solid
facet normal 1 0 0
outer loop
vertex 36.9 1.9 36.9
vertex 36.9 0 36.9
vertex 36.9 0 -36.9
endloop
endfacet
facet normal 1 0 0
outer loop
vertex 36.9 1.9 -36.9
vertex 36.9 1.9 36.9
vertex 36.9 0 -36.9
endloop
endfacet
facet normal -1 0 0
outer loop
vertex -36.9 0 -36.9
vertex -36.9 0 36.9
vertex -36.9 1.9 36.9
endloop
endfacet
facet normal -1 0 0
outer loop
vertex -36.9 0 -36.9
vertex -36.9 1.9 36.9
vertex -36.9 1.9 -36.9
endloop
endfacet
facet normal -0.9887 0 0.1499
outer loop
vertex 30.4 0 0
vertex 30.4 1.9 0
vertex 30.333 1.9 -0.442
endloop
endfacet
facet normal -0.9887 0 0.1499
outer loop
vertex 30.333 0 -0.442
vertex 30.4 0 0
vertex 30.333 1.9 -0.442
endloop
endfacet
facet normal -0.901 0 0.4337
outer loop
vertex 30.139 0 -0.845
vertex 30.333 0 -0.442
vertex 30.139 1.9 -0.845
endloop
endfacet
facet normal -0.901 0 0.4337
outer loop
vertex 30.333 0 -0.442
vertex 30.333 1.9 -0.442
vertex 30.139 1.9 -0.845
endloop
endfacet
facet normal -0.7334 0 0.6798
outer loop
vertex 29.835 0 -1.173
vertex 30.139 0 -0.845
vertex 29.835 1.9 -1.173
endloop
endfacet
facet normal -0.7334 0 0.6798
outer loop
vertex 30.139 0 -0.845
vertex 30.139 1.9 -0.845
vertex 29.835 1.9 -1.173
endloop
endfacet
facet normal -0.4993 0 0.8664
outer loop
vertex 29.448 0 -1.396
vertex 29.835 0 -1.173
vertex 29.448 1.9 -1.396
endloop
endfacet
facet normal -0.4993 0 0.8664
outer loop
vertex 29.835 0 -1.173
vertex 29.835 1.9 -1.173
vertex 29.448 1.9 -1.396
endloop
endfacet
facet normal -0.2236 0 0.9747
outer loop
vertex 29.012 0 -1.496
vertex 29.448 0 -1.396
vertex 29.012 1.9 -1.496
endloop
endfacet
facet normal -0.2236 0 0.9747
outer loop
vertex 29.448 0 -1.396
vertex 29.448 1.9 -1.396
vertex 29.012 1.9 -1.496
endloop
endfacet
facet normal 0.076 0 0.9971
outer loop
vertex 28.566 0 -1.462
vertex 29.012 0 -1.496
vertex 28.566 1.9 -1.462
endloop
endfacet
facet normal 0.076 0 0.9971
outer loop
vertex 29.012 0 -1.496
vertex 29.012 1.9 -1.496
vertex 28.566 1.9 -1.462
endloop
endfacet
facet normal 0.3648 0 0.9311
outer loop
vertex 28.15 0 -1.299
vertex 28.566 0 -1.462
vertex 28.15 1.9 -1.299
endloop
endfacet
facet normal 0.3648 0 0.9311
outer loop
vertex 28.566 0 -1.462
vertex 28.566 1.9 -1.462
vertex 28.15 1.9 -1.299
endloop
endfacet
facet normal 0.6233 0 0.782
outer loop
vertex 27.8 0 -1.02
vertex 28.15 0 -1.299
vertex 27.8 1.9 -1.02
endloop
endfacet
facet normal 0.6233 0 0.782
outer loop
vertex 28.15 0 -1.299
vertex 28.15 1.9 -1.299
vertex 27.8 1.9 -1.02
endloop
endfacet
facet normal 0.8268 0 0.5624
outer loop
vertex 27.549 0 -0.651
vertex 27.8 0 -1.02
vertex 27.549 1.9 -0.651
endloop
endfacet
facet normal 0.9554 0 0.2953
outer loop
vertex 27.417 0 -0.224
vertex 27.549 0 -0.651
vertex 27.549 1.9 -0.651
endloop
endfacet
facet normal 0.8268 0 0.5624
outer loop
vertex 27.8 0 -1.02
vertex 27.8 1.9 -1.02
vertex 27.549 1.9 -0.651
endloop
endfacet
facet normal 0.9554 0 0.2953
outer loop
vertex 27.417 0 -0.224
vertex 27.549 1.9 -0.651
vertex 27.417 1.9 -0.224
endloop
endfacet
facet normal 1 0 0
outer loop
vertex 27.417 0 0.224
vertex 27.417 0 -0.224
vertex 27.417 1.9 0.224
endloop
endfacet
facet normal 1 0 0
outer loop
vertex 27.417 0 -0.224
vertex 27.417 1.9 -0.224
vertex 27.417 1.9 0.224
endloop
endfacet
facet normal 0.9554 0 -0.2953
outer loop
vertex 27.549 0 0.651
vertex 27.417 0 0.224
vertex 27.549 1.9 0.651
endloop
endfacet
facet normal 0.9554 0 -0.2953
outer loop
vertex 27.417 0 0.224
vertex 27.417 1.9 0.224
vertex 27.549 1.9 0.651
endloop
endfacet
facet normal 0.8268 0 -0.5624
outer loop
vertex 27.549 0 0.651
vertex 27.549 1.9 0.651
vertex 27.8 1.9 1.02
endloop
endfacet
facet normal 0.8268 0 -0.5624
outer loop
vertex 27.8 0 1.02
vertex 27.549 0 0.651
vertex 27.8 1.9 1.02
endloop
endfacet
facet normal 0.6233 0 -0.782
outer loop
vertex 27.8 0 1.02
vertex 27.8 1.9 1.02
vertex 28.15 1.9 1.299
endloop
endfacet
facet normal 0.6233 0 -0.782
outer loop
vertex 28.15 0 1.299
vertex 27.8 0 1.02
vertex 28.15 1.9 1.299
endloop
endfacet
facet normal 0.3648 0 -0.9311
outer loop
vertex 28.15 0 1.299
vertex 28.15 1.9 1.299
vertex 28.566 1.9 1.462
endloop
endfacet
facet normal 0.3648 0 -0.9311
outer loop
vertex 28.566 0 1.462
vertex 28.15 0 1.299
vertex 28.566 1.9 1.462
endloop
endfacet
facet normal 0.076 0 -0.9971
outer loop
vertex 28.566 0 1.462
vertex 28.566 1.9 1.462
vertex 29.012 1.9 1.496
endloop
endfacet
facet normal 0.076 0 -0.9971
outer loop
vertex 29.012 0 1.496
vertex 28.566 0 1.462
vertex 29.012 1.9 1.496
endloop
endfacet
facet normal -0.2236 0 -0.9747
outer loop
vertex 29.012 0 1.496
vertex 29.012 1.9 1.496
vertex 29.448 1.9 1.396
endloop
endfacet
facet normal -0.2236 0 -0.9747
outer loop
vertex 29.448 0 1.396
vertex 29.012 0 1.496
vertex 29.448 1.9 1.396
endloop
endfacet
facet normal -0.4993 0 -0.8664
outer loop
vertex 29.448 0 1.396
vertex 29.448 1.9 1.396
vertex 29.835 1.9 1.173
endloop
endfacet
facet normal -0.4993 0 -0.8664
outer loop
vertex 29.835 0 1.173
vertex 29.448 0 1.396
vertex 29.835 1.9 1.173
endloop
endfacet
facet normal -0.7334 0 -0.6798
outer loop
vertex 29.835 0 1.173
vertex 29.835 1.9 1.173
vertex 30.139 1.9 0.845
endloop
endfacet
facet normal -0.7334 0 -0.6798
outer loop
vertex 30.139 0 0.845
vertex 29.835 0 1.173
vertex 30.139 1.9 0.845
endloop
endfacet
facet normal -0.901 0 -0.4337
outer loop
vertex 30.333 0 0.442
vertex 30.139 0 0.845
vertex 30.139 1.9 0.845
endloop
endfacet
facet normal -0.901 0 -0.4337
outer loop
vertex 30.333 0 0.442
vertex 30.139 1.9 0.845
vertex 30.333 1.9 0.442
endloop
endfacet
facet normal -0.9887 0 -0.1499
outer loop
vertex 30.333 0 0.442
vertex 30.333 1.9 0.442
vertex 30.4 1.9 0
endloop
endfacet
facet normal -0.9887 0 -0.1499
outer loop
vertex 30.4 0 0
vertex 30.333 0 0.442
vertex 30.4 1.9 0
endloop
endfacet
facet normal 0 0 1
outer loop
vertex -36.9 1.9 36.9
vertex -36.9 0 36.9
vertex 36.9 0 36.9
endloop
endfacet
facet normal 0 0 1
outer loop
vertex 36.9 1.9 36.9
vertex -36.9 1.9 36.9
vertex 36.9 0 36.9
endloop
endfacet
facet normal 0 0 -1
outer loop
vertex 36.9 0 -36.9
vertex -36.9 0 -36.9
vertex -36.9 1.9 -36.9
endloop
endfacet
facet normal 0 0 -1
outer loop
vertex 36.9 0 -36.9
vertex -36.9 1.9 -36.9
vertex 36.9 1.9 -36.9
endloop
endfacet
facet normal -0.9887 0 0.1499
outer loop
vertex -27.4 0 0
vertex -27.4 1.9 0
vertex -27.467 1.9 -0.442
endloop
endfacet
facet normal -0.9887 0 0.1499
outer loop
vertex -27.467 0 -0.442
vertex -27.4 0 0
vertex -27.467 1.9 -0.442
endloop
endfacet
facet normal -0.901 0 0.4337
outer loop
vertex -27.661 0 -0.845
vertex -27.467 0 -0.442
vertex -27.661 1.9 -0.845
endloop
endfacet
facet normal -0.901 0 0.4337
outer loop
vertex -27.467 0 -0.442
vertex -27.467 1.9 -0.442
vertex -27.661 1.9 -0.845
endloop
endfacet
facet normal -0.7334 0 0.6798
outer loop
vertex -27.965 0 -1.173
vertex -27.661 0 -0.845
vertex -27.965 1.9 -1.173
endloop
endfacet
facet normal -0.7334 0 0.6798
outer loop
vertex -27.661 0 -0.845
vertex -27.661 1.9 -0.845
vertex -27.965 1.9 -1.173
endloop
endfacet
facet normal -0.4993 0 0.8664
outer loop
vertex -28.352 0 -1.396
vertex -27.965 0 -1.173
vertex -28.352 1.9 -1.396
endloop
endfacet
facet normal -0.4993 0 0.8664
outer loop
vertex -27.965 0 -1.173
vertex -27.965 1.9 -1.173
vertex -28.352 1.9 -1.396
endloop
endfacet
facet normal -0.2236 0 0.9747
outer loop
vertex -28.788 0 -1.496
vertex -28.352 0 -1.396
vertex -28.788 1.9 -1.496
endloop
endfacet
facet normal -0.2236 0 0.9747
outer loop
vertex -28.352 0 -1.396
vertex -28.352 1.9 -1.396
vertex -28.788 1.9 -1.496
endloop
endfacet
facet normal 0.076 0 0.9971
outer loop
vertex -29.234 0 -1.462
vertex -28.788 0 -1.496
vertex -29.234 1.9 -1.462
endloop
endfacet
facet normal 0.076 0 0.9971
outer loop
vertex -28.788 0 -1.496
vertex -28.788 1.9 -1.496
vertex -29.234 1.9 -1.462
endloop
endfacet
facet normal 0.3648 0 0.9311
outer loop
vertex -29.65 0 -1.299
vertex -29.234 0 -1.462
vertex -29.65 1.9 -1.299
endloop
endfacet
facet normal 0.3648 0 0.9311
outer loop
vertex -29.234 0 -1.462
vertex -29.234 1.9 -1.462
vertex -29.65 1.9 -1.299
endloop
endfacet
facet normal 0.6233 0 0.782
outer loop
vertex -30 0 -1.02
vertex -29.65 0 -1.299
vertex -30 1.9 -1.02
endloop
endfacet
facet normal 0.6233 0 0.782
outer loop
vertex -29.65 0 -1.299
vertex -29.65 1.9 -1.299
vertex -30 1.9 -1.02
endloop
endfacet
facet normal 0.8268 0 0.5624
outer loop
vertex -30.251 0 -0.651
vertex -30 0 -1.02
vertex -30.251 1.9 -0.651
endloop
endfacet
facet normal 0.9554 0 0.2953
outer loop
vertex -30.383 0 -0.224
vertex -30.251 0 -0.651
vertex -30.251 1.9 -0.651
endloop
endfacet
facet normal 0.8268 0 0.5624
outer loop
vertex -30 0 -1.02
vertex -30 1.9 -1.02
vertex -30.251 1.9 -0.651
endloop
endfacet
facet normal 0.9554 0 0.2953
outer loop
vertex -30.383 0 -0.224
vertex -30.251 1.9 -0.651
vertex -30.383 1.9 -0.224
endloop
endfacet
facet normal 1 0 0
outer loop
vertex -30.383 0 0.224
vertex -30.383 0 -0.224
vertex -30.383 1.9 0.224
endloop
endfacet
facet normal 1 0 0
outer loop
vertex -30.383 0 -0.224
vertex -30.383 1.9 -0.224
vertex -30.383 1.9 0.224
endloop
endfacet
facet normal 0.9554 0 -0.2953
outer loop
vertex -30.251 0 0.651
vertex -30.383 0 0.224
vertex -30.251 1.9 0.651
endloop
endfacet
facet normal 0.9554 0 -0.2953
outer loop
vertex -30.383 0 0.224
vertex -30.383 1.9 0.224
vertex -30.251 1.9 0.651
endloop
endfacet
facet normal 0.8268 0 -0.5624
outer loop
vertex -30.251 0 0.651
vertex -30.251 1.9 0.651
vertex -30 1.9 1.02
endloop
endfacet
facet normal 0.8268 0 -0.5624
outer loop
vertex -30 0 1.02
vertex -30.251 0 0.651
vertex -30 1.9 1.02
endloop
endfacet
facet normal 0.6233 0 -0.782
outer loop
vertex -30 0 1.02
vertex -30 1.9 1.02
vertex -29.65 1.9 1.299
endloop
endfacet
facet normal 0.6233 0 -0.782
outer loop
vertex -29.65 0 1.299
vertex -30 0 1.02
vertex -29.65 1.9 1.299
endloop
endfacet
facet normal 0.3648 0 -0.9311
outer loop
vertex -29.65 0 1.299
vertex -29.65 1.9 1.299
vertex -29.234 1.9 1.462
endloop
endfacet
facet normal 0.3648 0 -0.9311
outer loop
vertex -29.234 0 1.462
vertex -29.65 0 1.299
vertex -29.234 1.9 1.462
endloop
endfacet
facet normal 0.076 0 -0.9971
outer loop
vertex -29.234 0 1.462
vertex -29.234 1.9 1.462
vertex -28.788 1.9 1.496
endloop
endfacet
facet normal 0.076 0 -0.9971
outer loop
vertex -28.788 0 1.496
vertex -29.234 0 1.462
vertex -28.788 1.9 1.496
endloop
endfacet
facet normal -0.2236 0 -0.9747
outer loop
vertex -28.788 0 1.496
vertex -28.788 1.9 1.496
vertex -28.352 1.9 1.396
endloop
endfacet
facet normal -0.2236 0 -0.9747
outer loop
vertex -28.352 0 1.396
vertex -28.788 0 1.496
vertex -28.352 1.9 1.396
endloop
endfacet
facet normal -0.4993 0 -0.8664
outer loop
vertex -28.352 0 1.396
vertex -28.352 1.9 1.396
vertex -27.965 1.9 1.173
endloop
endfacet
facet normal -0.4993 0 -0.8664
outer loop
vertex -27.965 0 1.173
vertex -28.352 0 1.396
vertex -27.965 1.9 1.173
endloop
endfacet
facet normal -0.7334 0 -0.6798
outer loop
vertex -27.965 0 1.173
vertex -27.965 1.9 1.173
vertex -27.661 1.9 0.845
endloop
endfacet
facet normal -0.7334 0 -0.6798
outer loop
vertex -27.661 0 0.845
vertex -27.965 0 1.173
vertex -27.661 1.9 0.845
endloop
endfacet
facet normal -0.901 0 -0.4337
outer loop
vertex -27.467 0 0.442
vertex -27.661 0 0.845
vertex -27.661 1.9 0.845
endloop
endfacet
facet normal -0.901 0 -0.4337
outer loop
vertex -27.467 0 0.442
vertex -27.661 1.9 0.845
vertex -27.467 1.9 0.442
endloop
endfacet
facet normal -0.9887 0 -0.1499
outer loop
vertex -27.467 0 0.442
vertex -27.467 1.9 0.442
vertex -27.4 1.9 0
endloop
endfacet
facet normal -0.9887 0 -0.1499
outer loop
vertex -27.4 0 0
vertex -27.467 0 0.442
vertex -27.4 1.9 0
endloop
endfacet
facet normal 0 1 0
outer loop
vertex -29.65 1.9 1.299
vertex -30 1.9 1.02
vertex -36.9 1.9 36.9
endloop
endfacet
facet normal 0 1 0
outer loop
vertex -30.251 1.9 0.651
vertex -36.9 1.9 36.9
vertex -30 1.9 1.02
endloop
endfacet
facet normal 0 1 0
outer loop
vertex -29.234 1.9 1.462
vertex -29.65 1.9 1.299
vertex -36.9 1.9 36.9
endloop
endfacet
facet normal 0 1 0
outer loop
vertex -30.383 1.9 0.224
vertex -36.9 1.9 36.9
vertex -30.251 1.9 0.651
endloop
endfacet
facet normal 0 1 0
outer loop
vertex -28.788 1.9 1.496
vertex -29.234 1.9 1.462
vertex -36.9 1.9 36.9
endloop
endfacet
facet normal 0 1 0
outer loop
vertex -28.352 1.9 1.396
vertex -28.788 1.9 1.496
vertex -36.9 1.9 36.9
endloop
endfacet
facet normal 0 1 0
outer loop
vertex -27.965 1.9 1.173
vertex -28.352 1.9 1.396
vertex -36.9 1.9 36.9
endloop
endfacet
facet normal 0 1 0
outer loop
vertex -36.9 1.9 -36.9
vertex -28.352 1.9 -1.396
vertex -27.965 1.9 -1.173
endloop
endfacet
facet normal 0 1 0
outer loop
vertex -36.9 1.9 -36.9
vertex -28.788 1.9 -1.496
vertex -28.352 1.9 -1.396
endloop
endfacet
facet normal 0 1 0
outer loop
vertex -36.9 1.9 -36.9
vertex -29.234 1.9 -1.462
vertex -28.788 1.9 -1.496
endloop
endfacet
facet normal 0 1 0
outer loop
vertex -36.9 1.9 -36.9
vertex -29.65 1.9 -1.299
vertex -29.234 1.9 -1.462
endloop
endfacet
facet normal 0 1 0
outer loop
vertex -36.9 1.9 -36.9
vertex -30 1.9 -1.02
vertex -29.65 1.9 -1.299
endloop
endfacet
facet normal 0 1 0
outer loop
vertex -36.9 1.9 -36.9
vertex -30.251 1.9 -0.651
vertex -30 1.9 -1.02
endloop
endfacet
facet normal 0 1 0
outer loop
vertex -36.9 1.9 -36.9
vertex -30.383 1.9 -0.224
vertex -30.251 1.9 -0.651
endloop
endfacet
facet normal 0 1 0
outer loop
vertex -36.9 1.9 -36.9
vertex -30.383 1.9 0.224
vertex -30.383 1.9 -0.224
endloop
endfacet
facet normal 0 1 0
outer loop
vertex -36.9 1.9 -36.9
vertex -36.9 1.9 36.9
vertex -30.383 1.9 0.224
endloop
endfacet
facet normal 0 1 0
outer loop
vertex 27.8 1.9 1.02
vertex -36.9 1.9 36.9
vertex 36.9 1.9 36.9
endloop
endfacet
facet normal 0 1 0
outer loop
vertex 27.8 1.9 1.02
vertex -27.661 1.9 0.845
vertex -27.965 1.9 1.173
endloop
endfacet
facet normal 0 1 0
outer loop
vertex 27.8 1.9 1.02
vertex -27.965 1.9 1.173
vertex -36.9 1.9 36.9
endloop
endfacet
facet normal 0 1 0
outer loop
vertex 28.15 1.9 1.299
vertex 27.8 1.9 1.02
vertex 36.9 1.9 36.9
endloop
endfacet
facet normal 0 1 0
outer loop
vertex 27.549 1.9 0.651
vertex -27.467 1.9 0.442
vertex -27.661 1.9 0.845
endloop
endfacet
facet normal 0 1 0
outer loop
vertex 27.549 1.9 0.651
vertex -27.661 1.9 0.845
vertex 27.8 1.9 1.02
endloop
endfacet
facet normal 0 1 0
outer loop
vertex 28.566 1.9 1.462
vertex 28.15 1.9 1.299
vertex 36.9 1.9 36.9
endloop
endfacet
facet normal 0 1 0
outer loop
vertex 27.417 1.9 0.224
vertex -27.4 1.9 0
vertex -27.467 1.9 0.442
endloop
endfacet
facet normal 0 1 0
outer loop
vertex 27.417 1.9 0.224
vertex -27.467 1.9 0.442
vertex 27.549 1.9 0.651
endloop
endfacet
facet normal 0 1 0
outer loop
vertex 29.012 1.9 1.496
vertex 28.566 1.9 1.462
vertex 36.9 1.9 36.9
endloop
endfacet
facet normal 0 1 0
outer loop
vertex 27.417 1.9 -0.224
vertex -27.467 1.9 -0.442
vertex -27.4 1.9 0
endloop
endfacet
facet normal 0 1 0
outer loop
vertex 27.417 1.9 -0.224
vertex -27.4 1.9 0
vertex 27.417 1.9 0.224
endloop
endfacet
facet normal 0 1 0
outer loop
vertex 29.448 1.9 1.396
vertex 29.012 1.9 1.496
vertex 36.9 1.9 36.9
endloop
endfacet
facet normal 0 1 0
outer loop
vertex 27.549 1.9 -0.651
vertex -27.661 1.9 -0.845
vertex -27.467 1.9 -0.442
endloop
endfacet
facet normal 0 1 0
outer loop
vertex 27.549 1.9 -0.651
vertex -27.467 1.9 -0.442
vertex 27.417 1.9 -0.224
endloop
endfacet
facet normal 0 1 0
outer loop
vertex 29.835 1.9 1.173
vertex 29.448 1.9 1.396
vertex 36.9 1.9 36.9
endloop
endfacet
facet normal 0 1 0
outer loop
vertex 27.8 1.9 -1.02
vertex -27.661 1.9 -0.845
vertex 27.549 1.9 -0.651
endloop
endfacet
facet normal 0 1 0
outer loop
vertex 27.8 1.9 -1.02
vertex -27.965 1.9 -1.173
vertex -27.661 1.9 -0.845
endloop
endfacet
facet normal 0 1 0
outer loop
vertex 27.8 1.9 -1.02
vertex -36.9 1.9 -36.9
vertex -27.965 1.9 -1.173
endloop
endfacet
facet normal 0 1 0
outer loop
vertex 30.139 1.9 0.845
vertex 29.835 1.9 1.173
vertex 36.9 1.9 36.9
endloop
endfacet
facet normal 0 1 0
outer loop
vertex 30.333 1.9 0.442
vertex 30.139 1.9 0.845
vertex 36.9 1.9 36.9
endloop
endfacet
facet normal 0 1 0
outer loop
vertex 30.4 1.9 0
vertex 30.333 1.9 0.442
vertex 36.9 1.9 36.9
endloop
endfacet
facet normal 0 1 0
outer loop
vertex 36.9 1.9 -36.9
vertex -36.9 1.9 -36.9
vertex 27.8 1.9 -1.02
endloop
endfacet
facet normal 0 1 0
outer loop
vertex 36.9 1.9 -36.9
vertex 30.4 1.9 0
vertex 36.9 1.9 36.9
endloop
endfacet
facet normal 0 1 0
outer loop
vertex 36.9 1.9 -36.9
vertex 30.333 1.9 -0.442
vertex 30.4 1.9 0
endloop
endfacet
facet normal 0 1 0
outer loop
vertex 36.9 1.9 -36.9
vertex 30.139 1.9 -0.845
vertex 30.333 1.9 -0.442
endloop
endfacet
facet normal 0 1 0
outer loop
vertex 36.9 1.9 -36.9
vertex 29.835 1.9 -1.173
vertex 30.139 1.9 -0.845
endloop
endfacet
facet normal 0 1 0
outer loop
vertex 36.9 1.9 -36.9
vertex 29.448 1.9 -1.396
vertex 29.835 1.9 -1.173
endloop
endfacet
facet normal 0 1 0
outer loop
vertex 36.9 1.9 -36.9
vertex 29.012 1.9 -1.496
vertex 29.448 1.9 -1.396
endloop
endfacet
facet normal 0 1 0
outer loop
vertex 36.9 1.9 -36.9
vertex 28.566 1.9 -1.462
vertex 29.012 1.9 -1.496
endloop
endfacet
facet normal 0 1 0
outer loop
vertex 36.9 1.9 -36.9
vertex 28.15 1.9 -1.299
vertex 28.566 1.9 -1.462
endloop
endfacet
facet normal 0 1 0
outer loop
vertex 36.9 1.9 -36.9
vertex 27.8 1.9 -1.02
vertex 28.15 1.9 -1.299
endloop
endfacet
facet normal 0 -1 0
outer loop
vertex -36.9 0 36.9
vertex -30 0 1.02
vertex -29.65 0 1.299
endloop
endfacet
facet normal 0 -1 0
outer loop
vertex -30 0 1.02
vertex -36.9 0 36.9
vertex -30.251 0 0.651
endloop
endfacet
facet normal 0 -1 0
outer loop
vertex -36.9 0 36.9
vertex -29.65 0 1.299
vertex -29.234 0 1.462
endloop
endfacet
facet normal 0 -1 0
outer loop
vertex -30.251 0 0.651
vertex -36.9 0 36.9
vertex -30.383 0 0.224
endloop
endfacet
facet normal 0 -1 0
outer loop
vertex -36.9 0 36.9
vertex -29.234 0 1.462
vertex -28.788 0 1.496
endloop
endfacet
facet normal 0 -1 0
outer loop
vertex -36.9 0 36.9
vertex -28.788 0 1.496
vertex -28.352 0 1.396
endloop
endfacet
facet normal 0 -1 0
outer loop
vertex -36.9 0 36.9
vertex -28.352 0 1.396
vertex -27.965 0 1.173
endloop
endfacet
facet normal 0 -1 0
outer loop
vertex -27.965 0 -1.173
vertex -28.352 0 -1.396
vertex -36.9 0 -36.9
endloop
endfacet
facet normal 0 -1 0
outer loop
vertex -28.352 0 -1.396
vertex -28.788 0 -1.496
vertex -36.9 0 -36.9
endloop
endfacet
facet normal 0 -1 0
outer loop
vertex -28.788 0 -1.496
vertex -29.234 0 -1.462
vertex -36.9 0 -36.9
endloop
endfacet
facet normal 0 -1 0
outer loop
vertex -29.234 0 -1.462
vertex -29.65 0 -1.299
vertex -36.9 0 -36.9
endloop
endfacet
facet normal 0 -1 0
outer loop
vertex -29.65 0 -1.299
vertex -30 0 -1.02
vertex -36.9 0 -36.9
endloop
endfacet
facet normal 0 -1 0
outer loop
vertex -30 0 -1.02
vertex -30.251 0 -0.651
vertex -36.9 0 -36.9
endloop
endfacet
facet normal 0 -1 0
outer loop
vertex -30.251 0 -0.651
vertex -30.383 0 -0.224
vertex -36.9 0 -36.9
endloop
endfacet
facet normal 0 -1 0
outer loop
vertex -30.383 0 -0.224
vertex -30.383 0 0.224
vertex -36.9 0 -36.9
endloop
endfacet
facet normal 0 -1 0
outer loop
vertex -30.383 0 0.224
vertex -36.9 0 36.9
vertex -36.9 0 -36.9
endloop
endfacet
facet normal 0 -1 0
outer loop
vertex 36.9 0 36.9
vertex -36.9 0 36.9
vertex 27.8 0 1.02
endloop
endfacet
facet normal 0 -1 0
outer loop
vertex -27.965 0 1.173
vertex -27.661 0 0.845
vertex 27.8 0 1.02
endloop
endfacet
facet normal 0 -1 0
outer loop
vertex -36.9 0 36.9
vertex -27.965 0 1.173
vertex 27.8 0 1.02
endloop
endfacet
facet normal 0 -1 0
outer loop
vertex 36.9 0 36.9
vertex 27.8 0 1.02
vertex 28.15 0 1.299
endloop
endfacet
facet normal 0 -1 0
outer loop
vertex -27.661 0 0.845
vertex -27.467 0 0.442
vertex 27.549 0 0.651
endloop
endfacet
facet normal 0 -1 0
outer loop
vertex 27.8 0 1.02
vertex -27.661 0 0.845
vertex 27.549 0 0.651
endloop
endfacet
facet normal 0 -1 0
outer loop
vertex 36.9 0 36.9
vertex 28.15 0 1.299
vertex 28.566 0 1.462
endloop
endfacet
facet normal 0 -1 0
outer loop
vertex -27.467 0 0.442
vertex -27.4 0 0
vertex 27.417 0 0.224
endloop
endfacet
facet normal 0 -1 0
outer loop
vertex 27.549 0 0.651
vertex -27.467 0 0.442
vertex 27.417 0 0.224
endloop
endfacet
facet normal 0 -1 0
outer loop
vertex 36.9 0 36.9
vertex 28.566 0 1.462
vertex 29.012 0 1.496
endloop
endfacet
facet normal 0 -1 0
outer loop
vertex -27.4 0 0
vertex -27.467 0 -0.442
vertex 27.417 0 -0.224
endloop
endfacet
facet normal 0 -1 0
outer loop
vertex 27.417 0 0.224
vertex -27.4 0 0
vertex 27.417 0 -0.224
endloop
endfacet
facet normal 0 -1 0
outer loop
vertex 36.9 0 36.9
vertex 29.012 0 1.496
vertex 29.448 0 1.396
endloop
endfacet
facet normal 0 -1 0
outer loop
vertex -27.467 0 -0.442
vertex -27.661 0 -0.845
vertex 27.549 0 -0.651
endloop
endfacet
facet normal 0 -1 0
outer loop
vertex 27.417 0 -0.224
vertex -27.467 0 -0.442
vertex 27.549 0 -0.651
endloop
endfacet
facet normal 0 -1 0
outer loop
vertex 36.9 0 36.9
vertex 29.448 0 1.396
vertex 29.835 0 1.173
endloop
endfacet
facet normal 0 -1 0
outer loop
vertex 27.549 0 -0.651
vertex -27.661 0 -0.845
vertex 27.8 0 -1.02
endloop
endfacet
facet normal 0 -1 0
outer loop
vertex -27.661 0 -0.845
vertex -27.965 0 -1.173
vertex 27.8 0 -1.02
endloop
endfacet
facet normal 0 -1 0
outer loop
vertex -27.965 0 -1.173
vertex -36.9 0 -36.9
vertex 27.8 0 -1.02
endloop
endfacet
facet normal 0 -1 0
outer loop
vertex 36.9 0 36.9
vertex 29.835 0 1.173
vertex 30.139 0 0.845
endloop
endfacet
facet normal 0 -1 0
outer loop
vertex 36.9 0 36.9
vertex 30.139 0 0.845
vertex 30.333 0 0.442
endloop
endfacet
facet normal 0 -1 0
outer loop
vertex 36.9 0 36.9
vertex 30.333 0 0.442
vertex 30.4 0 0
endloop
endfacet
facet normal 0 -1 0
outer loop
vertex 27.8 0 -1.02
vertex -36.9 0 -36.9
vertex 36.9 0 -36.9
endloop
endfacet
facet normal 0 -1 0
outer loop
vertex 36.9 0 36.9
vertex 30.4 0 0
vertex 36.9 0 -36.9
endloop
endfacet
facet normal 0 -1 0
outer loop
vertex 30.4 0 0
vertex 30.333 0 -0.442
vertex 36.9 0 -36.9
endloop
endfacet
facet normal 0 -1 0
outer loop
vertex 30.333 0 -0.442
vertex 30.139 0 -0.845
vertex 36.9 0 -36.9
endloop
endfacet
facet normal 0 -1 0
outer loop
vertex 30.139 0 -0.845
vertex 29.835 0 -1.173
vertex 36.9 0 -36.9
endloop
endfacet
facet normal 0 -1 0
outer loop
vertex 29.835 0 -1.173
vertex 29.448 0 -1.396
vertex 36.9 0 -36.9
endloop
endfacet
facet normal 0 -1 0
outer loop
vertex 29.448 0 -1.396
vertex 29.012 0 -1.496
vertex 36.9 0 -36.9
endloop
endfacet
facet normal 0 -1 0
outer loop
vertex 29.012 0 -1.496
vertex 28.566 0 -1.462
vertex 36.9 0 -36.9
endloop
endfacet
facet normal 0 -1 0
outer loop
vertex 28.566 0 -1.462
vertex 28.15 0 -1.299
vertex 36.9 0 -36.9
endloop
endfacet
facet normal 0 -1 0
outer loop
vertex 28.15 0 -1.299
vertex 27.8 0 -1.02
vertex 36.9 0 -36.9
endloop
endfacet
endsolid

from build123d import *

# Parameters (mm, degrees)
CROQUIS1_W                 = 73.8
CROQUIS1_H                 = 73.8
SALIENTE_EXTRUIR3_DEPTH    = 1.9
CROQUIS2_R                 = 1.5
CORTAR_EXTRUIR1_DEPTH      = 1
CORTAR_EXTRUIR1_DEPTH_BACK = 2.9


with BuildPart() as part:
    # Croquis1 → Saliente-Extruir3 (new body)
    with BuildSketch(Plane(origin=(0, 0, 0), x_dir=(1, 0, 0), z_dir=(0, 1, 0))):
        Rectangle(CROQUIS1_W, CROQUIS1_H)
    extrude(amount=SALIENTE_EXTRUIR3_DEPTH)

    # Croquis2 → Cortar-Extruir1 (cut, two sides)
    with BuildSketch(Plane(origin=(0, 1.9, 0), x_dir=(1, 0, 0), z_dir=(0, 1, 0))) as cortar_extruir1_sk:
        with Locations((-28.9, 0)):
            Circle(CROQUIS2_R)
        with Locations((28.9, 0)):
            Circle(CROQUIS2_R)
    extrude(amount=CORTAR_EXTRUIR1_DEPTH, mode=Mode.SUBTRACT)
    extrude(cortar_extruir1_sk.sketch, amount=-CORTAR_EXTRUIR1_DEPTH_BACK, mode=Mode.SUBTRACT)


solid = part.part
